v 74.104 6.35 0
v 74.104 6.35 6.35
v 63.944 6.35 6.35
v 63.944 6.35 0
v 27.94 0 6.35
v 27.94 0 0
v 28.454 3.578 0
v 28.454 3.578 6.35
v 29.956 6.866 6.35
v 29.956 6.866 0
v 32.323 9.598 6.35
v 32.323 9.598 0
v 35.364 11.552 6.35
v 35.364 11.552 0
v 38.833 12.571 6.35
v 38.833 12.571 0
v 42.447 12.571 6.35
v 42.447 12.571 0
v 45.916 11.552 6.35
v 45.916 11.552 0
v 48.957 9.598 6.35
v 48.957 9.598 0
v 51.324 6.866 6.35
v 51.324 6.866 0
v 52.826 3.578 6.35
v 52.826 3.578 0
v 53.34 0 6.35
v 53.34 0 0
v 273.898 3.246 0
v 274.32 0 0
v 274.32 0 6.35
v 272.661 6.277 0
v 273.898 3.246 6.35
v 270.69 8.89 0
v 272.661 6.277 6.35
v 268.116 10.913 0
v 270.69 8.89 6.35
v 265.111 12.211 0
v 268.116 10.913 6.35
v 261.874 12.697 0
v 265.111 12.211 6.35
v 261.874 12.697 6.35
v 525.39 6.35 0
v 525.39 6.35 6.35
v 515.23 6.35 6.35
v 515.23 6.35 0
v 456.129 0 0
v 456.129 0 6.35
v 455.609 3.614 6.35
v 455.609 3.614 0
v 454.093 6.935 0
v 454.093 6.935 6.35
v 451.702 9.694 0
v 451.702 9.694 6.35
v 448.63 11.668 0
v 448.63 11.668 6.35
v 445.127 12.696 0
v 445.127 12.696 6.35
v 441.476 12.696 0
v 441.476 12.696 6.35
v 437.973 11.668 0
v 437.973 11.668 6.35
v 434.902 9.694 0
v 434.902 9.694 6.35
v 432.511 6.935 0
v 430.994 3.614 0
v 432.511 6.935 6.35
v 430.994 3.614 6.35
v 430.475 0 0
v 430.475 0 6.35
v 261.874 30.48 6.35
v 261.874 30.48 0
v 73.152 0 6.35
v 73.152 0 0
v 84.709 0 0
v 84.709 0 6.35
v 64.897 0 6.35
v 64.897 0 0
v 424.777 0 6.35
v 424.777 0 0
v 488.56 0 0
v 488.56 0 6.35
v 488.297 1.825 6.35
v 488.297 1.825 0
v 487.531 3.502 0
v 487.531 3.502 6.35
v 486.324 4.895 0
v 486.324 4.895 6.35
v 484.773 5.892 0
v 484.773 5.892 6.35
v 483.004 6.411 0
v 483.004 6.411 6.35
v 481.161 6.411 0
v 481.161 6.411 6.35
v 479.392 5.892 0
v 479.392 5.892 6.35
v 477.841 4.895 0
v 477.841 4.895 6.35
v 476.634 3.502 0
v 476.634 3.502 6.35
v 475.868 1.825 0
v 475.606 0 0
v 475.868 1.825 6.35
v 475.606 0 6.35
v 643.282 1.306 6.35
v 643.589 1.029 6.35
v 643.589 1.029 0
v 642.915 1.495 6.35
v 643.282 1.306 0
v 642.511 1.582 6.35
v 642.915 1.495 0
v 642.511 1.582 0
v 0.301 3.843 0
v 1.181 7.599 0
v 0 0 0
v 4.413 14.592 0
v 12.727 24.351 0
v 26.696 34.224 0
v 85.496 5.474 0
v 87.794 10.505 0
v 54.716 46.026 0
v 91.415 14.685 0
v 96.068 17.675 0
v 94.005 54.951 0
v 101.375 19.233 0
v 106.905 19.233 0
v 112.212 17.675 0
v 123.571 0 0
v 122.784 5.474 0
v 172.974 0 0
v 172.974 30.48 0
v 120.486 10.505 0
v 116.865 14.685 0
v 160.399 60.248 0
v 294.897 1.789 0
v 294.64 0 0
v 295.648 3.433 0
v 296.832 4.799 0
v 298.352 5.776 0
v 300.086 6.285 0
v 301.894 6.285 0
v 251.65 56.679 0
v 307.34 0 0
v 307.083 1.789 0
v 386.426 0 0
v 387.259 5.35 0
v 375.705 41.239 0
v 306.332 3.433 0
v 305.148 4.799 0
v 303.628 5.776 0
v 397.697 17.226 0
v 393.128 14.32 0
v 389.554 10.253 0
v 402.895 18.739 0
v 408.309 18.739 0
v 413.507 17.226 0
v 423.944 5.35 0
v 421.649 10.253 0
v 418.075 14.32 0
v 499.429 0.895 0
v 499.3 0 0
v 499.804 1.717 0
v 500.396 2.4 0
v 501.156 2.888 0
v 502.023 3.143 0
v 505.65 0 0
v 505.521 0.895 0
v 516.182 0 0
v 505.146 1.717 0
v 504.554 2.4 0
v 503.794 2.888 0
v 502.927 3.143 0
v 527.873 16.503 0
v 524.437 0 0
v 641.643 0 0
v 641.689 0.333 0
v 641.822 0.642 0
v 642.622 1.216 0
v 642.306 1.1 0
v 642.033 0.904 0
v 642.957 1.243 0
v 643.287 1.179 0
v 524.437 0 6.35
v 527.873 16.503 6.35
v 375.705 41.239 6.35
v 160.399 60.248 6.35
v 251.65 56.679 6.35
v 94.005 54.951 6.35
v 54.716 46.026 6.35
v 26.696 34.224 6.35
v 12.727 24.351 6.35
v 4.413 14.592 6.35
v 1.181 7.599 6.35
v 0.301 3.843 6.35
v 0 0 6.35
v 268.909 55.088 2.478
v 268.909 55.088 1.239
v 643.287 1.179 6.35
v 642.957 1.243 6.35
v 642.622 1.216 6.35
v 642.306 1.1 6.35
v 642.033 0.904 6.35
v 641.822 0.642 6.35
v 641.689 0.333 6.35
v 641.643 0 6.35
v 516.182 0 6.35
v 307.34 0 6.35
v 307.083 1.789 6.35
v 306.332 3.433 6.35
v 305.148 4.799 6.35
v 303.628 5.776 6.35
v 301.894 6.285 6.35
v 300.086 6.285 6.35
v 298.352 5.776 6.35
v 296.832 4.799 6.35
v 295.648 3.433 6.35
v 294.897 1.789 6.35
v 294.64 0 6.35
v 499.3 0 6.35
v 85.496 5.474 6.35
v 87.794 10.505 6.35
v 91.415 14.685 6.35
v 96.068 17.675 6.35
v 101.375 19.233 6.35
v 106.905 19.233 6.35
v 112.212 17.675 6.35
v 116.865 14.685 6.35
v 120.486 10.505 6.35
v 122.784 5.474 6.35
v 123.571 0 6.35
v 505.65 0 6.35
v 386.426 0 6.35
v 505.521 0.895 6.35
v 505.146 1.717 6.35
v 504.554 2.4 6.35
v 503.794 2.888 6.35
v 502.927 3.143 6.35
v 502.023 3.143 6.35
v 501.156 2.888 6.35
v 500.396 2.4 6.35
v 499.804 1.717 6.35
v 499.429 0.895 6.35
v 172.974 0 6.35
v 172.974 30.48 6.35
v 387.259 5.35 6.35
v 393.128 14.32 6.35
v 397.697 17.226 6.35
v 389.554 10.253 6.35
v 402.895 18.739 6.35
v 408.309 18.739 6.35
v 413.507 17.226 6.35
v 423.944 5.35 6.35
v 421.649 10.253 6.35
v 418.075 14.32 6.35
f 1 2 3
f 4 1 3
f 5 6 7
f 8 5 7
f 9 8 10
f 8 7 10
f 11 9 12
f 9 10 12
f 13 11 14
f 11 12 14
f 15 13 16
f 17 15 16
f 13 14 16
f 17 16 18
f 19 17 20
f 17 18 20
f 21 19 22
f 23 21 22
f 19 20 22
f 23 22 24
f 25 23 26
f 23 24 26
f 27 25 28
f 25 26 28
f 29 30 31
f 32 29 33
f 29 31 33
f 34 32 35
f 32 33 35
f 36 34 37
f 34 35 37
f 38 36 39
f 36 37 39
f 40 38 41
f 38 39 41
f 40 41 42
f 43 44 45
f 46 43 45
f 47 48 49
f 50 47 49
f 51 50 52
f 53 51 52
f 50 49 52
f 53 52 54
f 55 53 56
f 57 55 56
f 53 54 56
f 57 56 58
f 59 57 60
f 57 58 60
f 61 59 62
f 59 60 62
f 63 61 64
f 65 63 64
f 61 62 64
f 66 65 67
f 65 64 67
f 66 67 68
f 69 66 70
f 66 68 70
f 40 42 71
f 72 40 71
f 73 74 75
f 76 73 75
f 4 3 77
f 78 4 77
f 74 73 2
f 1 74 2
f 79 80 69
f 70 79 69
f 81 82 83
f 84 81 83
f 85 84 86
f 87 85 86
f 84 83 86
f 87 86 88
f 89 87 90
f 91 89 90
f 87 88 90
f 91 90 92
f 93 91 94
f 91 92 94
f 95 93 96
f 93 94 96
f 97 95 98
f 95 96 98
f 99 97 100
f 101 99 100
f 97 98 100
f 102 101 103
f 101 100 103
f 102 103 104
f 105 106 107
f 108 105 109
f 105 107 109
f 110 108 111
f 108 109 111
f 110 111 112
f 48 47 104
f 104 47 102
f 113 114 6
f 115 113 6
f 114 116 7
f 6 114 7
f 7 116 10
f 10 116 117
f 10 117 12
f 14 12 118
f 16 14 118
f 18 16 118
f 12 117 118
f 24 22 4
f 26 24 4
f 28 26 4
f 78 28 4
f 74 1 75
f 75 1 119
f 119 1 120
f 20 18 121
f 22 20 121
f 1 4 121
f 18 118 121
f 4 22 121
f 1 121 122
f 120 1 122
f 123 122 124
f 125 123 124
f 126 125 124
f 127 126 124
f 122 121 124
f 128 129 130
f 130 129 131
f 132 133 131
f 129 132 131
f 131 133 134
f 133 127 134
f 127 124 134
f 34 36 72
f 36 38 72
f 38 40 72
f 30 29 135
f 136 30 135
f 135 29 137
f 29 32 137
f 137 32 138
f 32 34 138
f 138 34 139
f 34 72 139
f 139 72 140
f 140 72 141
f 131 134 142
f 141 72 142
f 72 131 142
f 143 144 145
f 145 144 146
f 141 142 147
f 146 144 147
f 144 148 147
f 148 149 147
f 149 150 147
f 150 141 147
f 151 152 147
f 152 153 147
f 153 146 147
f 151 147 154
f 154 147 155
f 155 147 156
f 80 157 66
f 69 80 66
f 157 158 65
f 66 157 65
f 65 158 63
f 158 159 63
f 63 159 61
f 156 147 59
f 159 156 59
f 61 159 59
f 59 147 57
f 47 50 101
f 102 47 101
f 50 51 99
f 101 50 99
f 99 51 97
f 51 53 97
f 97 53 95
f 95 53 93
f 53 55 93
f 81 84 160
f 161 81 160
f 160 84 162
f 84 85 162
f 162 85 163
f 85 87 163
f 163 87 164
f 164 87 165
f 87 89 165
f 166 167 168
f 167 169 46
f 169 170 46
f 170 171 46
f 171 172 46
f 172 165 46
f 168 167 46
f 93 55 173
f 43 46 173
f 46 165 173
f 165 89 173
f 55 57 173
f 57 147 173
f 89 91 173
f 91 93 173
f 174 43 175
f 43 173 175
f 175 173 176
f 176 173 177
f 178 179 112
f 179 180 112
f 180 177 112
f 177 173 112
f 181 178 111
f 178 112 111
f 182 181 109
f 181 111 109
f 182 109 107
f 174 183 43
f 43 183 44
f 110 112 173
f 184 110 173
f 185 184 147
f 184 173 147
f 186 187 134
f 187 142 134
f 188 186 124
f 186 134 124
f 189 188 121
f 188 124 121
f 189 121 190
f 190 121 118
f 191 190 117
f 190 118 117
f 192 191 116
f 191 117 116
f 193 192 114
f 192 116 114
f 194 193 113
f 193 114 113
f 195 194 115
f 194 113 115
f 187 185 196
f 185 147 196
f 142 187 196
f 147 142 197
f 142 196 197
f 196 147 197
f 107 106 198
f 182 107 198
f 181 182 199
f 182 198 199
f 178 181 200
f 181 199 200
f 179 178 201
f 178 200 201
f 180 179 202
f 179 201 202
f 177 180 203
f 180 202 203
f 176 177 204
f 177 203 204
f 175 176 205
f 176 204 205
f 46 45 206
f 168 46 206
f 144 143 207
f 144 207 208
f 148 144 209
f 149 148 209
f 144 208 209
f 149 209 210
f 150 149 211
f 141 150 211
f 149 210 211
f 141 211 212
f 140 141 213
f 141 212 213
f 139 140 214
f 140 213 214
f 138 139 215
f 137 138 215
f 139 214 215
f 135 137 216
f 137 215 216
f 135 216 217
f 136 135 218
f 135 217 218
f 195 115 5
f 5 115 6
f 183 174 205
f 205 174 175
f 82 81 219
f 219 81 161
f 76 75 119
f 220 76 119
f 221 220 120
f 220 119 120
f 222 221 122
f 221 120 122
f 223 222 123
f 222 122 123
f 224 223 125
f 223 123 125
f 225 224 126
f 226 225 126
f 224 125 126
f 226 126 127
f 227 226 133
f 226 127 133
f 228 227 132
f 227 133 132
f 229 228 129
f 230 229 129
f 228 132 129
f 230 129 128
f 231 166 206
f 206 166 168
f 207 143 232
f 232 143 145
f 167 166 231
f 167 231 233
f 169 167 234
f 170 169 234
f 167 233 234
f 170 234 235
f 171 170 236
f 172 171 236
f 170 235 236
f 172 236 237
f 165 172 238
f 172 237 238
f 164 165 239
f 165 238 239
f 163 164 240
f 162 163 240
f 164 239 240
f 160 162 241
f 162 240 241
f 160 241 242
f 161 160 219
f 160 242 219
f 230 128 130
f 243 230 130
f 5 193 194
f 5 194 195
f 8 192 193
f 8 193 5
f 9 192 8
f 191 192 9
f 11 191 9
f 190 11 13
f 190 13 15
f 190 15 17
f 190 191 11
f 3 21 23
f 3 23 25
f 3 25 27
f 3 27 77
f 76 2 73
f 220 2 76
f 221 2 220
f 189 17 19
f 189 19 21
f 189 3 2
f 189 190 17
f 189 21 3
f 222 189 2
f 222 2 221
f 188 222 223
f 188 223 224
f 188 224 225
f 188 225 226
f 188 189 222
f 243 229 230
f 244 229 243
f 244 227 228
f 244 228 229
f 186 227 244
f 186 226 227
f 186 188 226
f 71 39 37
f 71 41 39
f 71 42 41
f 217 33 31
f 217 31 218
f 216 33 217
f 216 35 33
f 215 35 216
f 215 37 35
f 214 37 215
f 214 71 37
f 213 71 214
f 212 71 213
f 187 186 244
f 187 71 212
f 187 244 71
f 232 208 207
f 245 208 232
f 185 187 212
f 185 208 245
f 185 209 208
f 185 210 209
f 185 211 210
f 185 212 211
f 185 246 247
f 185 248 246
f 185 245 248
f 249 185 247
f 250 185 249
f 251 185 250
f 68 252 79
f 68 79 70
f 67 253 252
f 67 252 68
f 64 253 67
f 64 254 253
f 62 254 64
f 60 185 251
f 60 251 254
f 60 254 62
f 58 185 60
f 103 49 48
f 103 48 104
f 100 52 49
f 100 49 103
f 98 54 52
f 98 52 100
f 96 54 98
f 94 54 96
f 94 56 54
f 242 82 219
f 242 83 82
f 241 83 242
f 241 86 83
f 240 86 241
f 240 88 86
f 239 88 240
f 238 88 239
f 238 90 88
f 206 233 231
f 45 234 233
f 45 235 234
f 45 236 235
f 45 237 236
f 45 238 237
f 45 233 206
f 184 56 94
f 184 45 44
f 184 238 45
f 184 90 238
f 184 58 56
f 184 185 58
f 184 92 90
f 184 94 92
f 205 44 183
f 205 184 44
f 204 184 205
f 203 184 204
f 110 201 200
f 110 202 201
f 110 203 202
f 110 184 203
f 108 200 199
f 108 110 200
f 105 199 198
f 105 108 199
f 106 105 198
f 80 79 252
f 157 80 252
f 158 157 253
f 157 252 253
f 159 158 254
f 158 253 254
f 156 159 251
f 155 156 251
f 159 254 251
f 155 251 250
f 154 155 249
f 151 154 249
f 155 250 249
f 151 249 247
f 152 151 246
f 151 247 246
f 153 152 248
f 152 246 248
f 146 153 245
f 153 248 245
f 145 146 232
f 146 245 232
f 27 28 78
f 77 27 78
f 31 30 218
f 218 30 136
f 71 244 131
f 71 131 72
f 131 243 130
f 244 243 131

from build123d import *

# Parameters (mm, degrees)
BOSS_EXTRUDE1_DEPTH     = 6.35
CUT_EXTRUDE1_DEPTH      = 1.0000001
CUT_EXTRUDE1_DEPTH_BACK = 7.3500001
SKETCH4_W               = 6.35
SKETCH4_H               = 6.35
SKETCH4_H_2             = 12.7
CUT_EXTRUDE2_DEPTH      = 6.35
SKETCH7_W               = 88.9
SKETCH7_H               = 60.96
CUT_EXTRUDE4_DEPTH      = 7.3500001
SKETCH8_R               = 1.2446
CUT_EXTRUDE5_DEPTH      = 7.3500001


with BuildPart() as part:
    # Sketch2 → Boss-Extrude1 (new body)
    with BuildSketch(Plane.XY):
        with BuildLine():
            ThreePointArc((84.709, 0), (104.14, 19.431), (123.571, 0))
            Line((123.571, 0), (460.660965279, 0))
            Line((460.660965279, 0), (473.360965279, 0))
            Line((473.360965279, 0), (643.966787522, 0))
            ThreePointArc((643.966787522, 0), (643.547407924, 1.075012082), (642.510849283, 1.582039112))
            add(Edge.make_bspline(
                [(642.510849283, 1.582039112), (641.993392355, 1.625070631), (638.093728429, 1.953546407), (630.413817462, 2.663385493), (619.014124193, 3.849253664), (606.374988512, 5.304428983), (592.543922516, 7.037634907), (577.585454095, 9.050636147), (561.564270734, 11.338919625), (544.549749946, 13.890665375), (526.614143658, 16.687720753), (507.832591566, 19.705111663), (488.282710288, 22.911672601), (468.044367735, 26.27043606), (447.199424328, 29.739007432), (425.831595832, 33.270324121), (404.02631566, 36.813220545), (381.870662856, 40.313266856), (359.453314895, 43.713502532), (336.86454415, 46.955447457), (314.196207315, 49.979843895), (291.541767704, 52.727712704), (268.996310773, 55.141201012), (246.65655865, 57.164603829), (224.620860897, 58.745176641), (202.989192599, 59.8341217), (181.863132616, 60.387506142), (161.345829027, 60.366961324), (141.542033828, 59.739895824), (122.558104573, 58.481758104), (104.502313427, 56.574303932), (87.485018636, 54.008935199), (71.619696083, 50.784752003), (57.023709725, 46.912543066), (43.82045433, 42.41500246), (32.141645239, 37.332204029), (22.129107375, 31.731455339), (13.932423524, 25.726412106), (7.689616489, 19.513207632), (3.463136343, 13.420354421), (1.106333228, 7.923389435), (0.154611582, 3.513796615), (0, 1.007496172), (0, 0)],
                knots=[0.020157042, 0.020157042, 0.020157042, 0.020157042, 0.021270888, 0.028552555, 0.036780684, 0.045920102, 0.055931764, 0.066772884, 0.07839713, 0.090754827, 0.103793165, 0.117456432, 0.131686226, 0.146421738, 0.161599998, 0.177156133, 0.193023668, 0.209134786, 0.225420633, 0.241811602, 0.258237647, 0.274628557, 0.290914287, 0.307025229, 0.322892517, 0.338448342, 0.353626207, 0.368361232, 0.382590428, 0.396252961, 0.409290412, 0.42164701, 0.433269881, 0.444109249, 0.45411864, 0.463255055, 0.471479114, 0.478755289, 0.485052318, 0.490344026, 0.494609833, 0.497833231, 0.5, 0.5, 0.5, 0.5], degree=3))
            Line((0, 0), (27.94, 0))
            ThreePointArc((27.94, 0), (40.64, 12.7), (53.34, 0))
            Line((53.34, 0), (84.709, 0))
        make_face()
    extrude(amount=BOSS_EXTRUDE1_DEPTH)

    # Sketch3 → Cut-Extrude1 (cut, two sides)
    with BuildSketch(Plane.XY.offset(6.35)) as cut_extrude1_sk:
        with BuildLine():
            ThreePointArc((424.777212339, 0), (405.60179385, 18.930718125), (386.426375361, 0))
            Line((386.426375361, 0), (424.777212339, 0))
        make_face()
        with BuildLine():
            Line((424.777212339, 0), (386.426375361, 0))
            ThreePointArc((386.426375361, 0), (405.478650373, -19.422886493), (424.77879385, -0.246281875))
            ThreePointArc((424.77879385, -0.246281875), (424.778398468, -0.123138399), (424.777212339, 0))
        make_face()
        with BuildLine():
            ThreePointArc((456.128866123, 0), (443.301866123, 12.827), (430.474866123, 0))
            Line((430.474866123, 0), (456.128866123, 0))
        make_face()
        with BuildLine():
            Line((456.128866123, 0), (430.474866123, 0))
            ThreePointArc((430.474866123, 0), (443.301866123, -12.827), (456.128866123, 0))
        make_face()
        with BuildLine():
            ThreePointArc((488.559534569, 0), (482.082534569, 6.477), (475.605534569, 0))
            Line((475.605534569, 0), (488.559534569, 0))
        make_face()
        with BuildLine():
            Line((488.559534569, 0), (475.605534569, 0))
            ThreePointArc((475.605534569, 0), (482.082534569, -6.477), (488.559534569, 0))
        make_face()
        with BuildLine():
            ThreePointArc((505.649992416, 0), (502.474992416, 3.175), (499.299992416, 0))
            Line((499.299992416, 0), (505.649992416, 0))
        make_face()
        with BuildLine():
            Line((505.649992416, 0), (499.299992416, 0))
            ThreePointArc((499.299992416, 0), (502.474992417, -3.175), (505.649992416, 0))
        make_face()
        with BuildLine():
            Line((274.32, 0), (248.92, 0))
            ThreePointArc((248.92, 0), (261.62, -12.7), (274.32, 0))
        make_face()
        with BuildLine():
            ThreePointArc((274.32, 0), (261.62, 12.7), (248.92, 0))
            Line((248.92, 0), (274.32, 0))
        make_face()
        with BuildLine():
            Line((294.64, 0), (307.34, 0))
            ThreePointArc((307.34, 0), (300.99, 6.35), (294.64, 0))
        make_face()
        with BuildLine():
            ThreePointArc((294.64, 0), (300.99, -6.35), (307.34, 0))
            Line((307.34, 0), (294.64, 0))
        make_face()
    extrude(amount=CUT_EXTRUDE1_DEPTH, mode=Mode.SUBTRACT)
    extrude(cut_extrude1_sk.sketch, amount=-CUT_EXTRUDE1_DEPTH_BACK, mode=Mode.SUBTRACT)

    # Sketch4 → Cut-Extrude2 (cut)
    with BuildSketch(Plane.XY.offset(6.35)):
        Polygon((63.9445, 6.35), (64.897, 0), (65.8495, 0), (65.8495, 6.35), align=None)
        Polygon((65.8495, 0), (64.897, 0), (65.8495, -6.35), align=None)
        with Locations((69.0245, 3.175)):
            Rectangle(SKETCH4_W, SKETCH4_H)
        with Locations((69.0245, -3.175)):
            Rectangle(SKETCH4_W, SKETCH4_H)
        Polygon((72.1995, 6.35), (72.1995, 0), (73.152, 0), (74.1045, 6.35), align=None)
        Polygon((73.152, 0), (72.1995, 0), (72.1995, -6.35), align=None)
        with Locations((520.309534569, 0)):
            Rectangle(SKETCH4_W, SKETCH4_H_2)
        Polygon((517.134534569, -6.35), (517.134534569, 6.35), (515.229534569, 6.35), align=None)
        Polygon((525.389534569, 6.35), (523.484534569, 6.35), (523.484534569, -6.35), align=None)
    extrude(amount=-CUT_EXTRUDE2_DEPTH, mode=Mode.SUBTRACT)

    # Sketch7 → Cut-Extrude4 (cut, through all)
    with BuildSketch(Plane(origin=(327.95923074, -13.751410445, 6.35), x_dir=(1, 0, 0), z_dir=(0, 0, 1))):
        with Locations((-110.53523074, 13.751410445)):
            Rectangle(SKETCH7_W, SKETCH7_H)
    extrude(amount=-CUT_EXTRUDE4_DEPTH, mode=Mode.SUBTRACT)

    # Sketch8 → Cut-Extrude5 (cut, through all)
    with BuildSketch(Plane(origin=(327.95923074, -13.751410445, 6.35), x_dir=(1, 0, 0), z_dir=(0, 0, 1))):
        with Locations((314.928477568, 13.751410445)):
            Circle(SKETCH8_R)
    extrude(amount=-CUT_EXTRUDE5_DEPTH, mode=Mode.SUBTRACT)


solid = part.part
